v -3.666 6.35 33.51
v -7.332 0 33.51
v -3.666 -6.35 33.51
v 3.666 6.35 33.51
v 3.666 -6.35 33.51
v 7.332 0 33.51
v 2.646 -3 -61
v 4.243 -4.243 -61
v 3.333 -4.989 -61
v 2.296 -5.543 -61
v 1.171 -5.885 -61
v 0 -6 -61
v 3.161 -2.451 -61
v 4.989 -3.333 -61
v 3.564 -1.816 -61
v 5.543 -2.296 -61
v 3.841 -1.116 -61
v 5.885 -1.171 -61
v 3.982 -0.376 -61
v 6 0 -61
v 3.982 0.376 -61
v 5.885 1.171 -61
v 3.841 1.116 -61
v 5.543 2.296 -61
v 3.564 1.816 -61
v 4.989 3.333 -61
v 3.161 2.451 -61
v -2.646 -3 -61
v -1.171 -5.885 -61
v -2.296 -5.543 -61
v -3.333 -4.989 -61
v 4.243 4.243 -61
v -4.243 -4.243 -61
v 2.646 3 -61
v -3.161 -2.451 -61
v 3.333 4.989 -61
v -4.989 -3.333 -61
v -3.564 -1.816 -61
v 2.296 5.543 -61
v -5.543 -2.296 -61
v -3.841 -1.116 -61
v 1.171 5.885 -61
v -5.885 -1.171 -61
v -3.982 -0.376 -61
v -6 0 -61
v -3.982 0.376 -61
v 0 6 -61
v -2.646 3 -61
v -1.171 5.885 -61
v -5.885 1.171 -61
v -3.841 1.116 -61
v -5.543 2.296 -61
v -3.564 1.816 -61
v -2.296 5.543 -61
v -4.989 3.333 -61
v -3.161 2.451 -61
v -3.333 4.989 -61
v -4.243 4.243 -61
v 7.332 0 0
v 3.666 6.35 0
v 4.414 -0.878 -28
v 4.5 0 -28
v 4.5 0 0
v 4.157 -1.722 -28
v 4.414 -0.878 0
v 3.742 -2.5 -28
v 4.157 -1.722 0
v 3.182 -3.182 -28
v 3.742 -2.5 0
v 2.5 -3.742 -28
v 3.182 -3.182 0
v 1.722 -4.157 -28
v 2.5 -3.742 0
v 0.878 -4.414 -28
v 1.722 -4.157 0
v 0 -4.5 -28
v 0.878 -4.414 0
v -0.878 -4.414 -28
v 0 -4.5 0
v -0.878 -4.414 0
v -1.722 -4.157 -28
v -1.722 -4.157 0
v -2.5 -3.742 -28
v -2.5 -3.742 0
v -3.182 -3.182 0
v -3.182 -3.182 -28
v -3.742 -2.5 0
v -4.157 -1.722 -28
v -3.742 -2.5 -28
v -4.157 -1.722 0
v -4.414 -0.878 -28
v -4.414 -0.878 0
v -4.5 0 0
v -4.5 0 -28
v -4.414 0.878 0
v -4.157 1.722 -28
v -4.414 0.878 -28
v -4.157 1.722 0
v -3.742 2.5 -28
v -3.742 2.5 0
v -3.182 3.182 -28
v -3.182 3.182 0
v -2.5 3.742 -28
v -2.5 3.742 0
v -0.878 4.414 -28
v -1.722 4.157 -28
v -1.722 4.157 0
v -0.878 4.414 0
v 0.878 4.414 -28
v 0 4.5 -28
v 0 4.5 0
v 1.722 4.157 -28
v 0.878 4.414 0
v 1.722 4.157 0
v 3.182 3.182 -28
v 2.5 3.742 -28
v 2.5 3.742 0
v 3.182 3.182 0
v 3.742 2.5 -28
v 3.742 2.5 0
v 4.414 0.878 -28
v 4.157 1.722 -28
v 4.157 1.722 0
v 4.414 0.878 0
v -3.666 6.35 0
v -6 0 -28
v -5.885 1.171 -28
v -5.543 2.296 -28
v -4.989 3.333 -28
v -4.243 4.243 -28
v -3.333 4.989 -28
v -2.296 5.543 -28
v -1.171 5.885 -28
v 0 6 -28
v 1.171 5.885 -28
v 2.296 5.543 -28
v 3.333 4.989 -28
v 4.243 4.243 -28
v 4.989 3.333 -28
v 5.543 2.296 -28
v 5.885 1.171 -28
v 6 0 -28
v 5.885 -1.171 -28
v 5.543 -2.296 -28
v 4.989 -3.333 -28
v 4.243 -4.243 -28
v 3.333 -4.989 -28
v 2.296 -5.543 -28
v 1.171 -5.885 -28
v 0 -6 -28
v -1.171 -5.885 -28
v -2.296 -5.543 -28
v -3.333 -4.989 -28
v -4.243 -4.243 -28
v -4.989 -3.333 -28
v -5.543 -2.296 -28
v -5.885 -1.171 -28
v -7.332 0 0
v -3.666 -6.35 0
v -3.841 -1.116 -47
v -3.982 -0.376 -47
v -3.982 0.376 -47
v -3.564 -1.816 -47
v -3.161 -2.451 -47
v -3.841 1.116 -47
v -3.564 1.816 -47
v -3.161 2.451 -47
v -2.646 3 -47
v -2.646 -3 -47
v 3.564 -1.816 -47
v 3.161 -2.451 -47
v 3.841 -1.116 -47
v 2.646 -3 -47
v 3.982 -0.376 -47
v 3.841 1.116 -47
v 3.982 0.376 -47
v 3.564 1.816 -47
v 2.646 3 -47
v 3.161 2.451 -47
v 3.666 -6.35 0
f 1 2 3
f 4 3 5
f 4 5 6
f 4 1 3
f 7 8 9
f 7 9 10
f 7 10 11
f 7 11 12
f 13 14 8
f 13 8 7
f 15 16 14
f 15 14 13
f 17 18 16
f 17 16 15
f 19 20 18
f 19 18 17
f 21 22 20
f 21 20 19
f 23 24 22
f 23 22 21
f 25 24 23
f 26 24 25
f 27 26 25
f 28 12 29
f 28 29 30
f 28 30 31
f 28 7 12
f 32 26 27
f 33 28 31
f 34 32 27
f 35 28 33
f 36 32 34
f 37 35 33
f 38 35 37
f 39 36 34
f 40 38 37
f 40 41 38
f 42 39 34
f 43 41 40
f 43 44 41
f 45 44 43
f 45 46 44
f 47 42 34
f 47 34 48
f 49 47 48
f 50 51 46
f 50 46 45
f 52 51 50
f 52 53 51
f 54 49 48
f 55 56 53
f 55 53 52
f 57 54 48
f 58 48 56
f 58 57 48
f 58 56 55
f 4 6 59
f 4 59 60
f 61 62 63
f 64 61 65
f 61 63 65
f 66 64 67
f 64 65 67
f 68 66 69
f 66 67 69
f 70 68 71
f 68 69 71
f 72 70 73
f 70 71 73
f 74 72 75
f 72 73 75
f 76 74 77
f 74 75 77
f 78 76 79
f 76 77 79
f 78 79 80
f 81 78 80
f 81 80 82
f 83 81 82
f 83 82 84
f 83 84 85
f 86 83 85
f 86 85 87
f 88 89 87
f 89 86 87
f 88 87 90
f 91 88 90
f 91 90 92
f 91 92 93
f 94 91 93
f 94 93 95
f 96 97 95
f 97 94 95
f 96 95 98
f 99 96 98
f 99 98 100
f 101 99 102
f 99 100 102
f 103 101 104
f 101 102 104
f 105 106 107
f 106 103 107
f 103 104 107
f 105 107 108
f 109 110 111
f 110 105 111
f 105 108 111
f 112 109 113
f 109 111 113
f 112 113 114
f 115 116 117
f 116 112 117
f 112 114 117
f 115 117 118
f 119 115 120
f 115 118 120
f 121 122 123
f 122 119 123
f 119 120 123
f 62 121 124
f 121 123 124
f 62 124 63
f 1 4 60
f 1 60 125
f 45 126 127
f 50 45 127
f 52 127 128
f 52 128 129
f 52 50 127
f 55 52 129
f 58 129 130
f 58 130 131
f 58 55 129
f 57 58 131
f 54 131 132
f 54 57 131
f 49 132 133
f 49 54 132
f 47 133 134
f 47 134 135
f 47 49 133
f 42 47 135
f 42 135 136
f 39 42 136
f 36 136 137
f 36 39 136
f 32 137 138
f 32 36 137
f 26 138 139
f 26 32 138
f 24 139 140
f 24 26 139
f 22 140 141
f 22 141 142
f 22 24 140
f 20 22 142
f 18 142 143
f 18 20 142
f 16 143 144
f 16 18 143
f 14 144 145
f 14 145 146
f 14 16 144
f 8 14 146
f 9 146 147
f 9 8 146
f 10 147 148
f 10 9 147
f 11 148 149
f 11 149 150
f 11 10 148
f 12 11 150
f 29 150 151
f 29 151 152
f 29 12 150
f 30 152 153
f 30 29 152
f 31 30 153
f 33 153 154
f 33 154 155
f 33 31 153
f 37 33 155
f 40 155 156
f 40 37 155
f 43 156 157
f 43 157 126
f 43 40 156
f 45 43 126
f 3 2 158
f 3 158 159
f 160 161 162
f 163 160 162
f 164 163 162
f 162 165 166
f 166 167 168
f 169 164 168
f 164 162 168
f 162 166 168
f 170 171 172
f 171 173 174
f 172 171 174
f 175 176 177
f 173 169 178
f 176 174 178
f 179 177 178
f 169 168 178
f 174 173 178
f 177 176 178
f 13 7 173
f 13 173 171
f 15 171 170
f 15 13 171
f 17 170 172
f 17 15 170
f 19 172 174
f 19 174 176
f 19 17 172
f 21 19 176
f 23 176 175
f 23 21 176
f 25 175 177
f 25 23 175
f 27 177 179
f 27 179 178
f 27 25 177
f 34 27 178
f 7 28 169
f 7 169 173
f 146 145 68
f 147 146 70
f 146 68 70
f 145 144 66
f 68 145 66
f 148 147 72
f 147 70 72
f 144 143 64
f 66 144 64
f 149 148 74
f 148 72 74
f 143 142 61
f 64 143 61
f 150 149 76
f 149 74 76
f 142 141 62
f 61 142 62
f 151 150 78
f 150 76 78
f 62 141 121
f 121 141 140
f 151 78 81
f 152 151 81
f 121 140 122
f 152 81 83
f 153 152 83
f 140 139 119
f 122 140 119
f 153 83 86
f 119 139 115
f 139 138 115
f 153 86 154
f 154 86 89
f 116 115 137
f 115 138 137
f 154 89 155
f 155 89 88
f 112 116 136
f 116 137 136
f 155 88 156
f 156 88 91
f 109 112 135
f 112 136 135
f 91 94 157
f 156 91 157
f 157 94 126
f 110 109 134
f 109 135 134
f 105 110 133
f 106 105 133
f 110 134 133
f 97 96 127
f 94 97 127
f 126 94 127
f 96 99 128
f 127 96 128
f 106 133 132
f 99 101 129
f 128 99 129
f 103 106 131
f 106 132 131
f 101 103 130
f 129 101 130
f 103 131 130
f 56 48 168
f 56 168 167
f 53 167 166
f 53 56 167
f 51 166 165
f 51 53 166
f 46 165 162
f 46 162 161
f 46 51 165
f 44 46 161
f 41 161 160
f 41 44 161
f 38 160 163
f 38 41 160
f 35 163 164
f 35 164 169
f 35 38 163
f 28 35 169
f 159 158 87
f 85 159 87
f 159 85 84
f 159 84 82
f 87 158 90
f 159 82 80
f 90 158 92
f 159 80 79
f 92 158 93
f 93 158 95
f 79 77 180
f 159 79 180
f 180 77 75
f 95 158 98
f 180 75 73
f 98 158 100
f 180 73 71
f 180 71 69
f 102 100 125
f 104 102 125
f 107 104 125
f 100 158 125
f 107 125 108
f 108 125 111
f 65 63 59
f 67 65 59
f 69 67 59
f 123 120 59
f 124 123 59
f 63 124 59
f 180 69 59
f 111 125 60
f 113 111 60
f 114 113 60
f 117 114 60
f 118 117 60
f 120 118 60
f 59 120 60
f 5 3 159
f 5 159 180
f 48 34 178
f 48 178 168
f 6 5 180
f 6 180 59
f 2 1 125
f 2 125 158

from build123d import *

# Parameters (mm, degrees)
BOSS_EXTRUDE1_DEPTH = 27
SKETCH2_R           = 4.5
BOSS_EXTRUDE2_DEPTH = 61
CUT_EXTRUDE1_DEPTH  = 14
SKETCH4_R           = 6
BOSS_EXTRUDE3_DEPTH = 33
BOSS_EXTRUDE4_DEPTH = 6.51


with BuildPart() as part:
    # Sketch1 → Boss-Extrude1 (new body)
    with BuildSketch(Plane.XY):
        Polygon((3.666174209, -6.35), (7.332348419, 0), (3.666174209, 6.35), (-3.666174209, 6.35), (-7.332348419, 0), (-3.666174209, -6.35), align=None)
    extrude(amount=BOSS_EXTRUDE1_DEPTH)

    # Sketch2 → Boss-Extrude2 (add)
    with BuildSketch(Plane(origin=(0, 0, 0), x_dir=(-1, 0, 0), z_dir=(0, 0, -1))):
        with Locations(Location((0, 0, 0), (0, 0, 180))):
            Circle(SKETCH2_R)
    extrude(amount=BOSS_EXTRUDE2_DEPTH)

    # Sketch3 → Cut-Extrude1 (cut)
    with BuildSketch(Plane(origin=(0, 0, -61), x_dir=(-1, 0, 0), z_dir=(0, 0, -1))):
        with BuildLine():
            Line((-2.645751311, 3), (2.645751311, 3))
            ThreePointArc((2.645751311, 3), (4, 0), (2.645751311, -3))
            Line((2.645751311, -3), (-2.645751311, -3))
            ThreePointArc((-2.645751311, -3), (-4, 0), (-2.645751311, 3))
        make_face()
    extrude(amount=-CUT_EXTRUDE1_DEPTH, mode=Mode.SUBTRACT)

    # Sketch4 → Boss-Extrude3 (add)
    with BuildSketch(Plane(origin=(0, 0, -61), x_dir=(-1, 0, 0), z_dir=(0, 0, -1))):
        Circle(SKETCH4_R)
        with BuildLine():
            Line((-2.645751311, -3), (2.645751311, -3))
            ThreePointArc((2.645751311, -3), (4, 0), (2.645751311, 3))
            Line((2.645751311, 3), (-2.645751311, 3))
            ThreePointArc((-2.645751311, 3), (-4, 0), (-2.645751311, -3))
        make_face(mode=Mode.SUBTRACT)
    extrude(amount=-BOSS_EXTRUDE3_DEPTH)

    # Sketch5 → Boss-Extrude4 (add)
    with BuildSketch(Plane.XY.offset(27)):
        Polygon((-3.666174209, 6.35), (-7.332348419, 0), (-3.666174209, -6.35), (3.666174209, -6.35), (7.332348419, 0), (3.666174209, 6.35), align=None)
    extrude(amount=BOSS_EXTRUDE4_DEPTH)


solid = part.part
